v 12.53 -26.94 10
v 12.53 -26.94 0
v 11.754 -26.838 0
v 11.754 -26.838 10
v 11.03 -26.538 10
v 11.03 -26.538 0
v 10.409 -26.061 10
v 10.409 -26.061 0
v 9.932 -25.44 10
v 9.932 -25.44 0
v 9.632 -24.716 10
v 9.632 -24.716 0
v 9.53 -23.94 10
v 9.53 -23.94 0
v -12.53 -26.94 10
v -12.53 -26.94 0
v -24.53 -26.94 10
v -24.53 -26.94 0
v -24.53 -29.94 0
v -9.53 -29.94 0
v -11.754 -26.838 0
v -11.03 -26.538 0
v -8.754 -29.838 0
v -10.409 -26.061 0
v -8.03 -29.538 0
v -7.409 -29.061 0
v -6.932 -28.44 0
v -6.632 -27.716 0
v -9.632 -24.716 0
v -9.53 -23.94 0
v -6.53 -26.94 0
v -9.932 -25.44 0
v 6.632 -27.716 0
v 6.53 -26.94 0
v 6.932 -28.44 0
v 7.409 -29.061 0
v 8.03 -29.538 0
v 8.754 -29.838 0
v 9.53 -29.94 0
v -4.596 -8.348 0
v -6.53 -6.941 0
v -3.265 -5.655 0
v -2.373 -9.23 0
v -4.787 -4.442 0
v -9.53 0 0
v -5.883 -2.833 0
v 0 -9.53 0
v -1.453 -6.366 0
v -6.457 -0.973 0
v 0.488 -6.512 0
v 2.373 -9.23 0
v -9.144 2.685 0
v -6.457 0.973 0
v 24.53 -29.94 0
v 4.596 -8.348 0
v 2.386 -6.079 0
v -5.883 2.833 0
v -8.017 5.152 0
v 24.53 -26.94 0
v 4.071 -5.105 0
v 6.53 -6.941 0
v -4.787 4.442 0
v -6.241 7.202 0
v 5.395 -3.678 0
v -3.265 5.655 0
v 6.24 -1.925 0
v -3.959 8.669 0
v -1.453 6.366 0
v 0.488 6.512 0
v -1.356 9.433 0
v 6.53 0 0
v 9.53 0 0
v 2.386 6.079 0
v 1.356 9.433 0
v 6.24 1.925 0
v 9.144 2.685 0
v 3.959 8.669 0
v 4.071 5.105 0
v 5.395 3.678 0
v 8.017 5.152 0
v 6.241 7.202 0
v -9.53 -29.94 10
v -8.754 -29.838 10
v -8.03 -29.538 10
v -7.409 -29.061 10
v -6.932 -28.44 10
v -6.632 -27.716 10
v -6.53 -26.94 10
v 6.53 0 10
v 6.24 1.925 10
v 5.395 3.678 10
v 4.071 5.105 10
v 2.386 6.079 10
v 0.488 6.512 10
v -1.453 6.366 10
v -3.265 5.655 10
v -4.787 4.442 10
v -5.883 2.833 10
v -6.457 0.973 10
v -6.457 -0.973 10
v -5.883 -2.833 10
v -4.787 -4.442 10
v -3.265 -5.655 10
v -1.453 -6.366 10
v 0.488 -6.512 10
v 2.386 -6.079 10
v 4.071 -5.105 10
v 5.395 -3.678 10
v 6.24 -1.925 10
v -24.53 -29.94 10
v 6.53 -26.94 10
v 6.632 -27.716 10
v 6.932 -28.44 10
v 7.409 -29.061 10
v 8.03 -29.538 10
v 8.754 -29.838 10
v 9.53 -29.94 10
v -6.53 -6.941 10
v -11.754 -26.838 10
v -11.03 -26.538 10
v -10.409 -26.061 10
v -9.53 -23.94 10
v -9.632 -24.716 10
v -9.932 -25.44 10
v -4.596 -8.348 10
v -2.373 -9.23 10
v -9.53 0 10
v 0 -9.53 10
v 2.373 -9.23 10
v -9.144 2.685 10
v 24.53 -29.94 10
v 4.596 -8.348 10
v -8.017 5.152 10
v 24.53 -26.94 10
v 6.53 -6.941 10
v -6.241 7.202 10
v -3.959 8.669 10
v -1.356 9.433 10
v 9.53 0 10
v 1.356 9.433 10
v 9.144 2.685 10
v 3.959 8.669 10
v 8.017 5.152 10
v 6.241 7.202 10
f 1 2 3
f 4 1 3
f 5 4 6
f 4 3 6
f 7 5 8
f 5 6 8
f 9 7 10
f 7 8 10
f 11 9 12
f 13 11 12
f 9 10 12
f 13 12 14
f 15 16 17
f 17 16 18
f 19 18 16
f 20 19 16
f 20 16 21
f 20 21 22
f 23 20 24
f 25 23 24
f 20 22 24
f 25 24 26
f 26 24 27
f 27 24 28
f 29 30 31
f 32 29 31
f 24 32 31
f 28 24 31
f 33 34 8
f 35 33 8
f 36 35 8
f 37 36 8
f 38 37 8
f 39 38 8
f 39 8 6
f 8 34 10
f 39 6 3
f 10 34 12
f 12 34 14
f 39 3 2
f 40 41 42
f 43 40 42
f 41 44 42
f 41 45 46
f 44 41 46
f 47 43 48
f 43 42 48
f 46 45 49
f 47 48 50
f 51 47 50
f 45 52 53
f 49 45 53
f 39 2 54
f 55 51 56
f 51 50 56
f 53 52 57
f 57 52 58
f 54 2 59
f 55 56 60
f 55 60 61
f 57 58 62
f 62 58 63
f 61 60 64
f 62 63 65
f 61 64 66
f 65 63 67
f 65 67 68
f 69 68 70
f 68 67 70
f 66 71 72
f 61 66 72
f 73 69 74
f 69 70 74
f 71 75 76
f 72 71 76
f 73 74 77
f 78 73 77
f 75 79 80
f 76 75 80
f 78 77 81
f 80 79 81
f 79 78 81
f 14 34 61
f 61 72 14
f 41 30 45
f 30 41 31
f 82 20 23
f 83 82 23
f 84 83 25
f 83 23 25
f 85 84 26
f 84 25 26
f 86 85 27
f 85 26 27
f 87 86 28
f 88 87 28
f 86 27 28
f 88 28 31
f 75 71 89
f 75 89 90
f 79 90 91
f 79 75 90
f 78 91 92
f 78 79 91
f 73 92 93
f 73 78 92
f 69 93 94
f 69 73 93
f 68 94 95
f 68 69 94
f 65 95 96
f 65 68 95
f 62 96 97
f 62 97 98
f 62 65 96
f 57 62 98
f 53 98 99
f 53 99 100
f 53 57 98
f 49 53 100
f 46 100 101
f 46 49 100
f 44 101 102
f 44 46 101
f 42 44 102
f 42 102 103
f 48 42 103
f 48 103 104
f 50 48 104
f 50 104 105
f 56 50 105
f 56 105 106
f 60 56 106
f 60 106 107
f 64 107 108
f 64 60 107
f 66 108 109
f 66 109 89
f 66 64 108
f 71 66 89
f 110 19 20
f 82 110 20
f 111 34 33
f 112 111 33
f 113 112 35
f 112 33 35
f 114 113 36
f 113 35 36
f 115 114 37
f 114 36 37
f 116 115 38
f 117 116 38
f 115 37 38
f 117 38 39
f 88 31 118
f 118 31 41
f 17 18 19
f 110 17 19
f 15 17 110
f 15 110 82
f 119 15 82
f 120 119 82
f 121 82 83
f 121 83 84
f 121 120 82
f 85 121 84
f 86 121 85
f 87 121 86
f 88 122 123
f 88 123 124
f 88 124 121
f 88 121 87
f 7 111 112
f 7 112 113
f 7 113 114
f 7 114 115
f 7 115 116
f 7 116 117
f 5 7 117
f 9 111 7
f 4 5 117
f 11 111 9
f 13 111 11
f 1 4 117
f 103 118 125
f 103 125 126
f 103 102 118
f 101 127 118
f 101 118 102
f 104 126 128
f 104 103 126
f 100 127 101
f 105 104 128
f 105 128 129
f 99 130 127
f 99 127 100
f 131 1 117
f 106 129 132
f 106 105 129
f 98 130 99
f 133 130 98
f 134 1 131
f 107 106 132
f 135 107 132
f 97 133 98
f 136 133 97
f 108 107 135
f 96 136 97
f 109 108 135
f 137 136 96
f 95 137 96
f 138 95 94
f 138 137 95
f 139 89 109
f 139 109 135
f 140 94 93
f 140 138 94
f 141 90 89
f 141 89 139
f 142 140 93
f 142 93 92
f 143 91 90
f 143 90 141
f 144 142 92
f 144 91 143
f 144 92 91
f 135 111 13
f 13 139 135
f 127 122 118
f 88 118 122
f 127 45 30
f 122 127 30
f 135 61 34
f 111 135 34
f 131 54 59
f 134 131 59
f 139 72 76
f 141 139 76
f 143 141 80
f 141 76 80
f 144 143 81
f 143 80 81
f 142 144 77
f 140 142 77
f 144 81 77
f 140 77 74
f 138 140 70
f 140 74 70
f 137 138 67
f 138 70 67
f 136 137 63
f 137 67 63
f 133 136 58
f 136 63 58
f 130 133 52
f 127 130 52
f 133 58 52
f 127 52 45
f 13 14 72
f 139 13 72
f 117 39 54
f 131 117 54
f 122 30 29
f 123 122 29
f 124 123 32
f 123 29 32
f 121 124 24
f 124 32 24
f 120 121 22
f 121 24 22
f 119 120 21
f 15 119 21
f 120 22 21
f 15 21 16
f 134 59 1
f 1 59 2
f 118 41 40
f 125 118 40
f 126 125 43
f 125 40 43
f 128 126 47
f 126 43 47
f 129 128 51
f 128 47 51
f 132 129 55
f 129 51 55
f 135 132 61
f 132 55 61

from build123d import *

# Parameters (mm, degrees)
SKETCH1_R           = 6.53
BOSS_EXTRUDE1_DEPTH = 10


with BuildPart() as part:
    # Sketch1 → Boss-Extrude1 (new body)
    with BuildSketch(Plane.XY):
        with BuildLine():
            Line((6.53, -6.941181456), (6.53, -26.94))
            ThreePointArc((6.53, -26.94), (7.408679656, -29.061320344), (9.53, -29.94))
            Line((9.53, -29.94), (24.53, -29.94))
            Line((24.53, -29.94), (24.53, -26.94))
            Line((24.53, -26.94), (12.53, -26.94))
            ThreePointArc((12.53, -26.94), (10.408679656, -26.061320344), (9.53, -23.94))
            Line((9.53, -23.94), (9.53, 0))
            ThreePointArc((9.53, 0), (0, 9.53), (-9.53, 0))
            Line((-9.53, 0), (-9.53, -23.94))
            ThreePointArc((-9.53, -23.94), (-10.408679656, -26.061320344), (-12.53, -26.94))
            Line((-12.53, -26.94), (-24.53, -26.94))
            Line((-24.53, -26.94), (-24.53, -29.94))
            Line((-24.53, -29.94), (-9.53, -29.94))
            ThreePointArc((-9.53, -29.94), (-7.408679656, -29.061320344), (-6.53, -26.94))
            Line((-6.53, -26.94), (-6.53, -6.941181456))
            ThreePointArc((-6.53, -6.941181456), (0, -9.53), (6.53, -6.941181456))
        make_face()
        Circle(SKETCH1_R, mode=Mode.SUBTRACT)
    extrude(amount=BOSS_EXTRUDE1_DEPTH)


solid = part.part
